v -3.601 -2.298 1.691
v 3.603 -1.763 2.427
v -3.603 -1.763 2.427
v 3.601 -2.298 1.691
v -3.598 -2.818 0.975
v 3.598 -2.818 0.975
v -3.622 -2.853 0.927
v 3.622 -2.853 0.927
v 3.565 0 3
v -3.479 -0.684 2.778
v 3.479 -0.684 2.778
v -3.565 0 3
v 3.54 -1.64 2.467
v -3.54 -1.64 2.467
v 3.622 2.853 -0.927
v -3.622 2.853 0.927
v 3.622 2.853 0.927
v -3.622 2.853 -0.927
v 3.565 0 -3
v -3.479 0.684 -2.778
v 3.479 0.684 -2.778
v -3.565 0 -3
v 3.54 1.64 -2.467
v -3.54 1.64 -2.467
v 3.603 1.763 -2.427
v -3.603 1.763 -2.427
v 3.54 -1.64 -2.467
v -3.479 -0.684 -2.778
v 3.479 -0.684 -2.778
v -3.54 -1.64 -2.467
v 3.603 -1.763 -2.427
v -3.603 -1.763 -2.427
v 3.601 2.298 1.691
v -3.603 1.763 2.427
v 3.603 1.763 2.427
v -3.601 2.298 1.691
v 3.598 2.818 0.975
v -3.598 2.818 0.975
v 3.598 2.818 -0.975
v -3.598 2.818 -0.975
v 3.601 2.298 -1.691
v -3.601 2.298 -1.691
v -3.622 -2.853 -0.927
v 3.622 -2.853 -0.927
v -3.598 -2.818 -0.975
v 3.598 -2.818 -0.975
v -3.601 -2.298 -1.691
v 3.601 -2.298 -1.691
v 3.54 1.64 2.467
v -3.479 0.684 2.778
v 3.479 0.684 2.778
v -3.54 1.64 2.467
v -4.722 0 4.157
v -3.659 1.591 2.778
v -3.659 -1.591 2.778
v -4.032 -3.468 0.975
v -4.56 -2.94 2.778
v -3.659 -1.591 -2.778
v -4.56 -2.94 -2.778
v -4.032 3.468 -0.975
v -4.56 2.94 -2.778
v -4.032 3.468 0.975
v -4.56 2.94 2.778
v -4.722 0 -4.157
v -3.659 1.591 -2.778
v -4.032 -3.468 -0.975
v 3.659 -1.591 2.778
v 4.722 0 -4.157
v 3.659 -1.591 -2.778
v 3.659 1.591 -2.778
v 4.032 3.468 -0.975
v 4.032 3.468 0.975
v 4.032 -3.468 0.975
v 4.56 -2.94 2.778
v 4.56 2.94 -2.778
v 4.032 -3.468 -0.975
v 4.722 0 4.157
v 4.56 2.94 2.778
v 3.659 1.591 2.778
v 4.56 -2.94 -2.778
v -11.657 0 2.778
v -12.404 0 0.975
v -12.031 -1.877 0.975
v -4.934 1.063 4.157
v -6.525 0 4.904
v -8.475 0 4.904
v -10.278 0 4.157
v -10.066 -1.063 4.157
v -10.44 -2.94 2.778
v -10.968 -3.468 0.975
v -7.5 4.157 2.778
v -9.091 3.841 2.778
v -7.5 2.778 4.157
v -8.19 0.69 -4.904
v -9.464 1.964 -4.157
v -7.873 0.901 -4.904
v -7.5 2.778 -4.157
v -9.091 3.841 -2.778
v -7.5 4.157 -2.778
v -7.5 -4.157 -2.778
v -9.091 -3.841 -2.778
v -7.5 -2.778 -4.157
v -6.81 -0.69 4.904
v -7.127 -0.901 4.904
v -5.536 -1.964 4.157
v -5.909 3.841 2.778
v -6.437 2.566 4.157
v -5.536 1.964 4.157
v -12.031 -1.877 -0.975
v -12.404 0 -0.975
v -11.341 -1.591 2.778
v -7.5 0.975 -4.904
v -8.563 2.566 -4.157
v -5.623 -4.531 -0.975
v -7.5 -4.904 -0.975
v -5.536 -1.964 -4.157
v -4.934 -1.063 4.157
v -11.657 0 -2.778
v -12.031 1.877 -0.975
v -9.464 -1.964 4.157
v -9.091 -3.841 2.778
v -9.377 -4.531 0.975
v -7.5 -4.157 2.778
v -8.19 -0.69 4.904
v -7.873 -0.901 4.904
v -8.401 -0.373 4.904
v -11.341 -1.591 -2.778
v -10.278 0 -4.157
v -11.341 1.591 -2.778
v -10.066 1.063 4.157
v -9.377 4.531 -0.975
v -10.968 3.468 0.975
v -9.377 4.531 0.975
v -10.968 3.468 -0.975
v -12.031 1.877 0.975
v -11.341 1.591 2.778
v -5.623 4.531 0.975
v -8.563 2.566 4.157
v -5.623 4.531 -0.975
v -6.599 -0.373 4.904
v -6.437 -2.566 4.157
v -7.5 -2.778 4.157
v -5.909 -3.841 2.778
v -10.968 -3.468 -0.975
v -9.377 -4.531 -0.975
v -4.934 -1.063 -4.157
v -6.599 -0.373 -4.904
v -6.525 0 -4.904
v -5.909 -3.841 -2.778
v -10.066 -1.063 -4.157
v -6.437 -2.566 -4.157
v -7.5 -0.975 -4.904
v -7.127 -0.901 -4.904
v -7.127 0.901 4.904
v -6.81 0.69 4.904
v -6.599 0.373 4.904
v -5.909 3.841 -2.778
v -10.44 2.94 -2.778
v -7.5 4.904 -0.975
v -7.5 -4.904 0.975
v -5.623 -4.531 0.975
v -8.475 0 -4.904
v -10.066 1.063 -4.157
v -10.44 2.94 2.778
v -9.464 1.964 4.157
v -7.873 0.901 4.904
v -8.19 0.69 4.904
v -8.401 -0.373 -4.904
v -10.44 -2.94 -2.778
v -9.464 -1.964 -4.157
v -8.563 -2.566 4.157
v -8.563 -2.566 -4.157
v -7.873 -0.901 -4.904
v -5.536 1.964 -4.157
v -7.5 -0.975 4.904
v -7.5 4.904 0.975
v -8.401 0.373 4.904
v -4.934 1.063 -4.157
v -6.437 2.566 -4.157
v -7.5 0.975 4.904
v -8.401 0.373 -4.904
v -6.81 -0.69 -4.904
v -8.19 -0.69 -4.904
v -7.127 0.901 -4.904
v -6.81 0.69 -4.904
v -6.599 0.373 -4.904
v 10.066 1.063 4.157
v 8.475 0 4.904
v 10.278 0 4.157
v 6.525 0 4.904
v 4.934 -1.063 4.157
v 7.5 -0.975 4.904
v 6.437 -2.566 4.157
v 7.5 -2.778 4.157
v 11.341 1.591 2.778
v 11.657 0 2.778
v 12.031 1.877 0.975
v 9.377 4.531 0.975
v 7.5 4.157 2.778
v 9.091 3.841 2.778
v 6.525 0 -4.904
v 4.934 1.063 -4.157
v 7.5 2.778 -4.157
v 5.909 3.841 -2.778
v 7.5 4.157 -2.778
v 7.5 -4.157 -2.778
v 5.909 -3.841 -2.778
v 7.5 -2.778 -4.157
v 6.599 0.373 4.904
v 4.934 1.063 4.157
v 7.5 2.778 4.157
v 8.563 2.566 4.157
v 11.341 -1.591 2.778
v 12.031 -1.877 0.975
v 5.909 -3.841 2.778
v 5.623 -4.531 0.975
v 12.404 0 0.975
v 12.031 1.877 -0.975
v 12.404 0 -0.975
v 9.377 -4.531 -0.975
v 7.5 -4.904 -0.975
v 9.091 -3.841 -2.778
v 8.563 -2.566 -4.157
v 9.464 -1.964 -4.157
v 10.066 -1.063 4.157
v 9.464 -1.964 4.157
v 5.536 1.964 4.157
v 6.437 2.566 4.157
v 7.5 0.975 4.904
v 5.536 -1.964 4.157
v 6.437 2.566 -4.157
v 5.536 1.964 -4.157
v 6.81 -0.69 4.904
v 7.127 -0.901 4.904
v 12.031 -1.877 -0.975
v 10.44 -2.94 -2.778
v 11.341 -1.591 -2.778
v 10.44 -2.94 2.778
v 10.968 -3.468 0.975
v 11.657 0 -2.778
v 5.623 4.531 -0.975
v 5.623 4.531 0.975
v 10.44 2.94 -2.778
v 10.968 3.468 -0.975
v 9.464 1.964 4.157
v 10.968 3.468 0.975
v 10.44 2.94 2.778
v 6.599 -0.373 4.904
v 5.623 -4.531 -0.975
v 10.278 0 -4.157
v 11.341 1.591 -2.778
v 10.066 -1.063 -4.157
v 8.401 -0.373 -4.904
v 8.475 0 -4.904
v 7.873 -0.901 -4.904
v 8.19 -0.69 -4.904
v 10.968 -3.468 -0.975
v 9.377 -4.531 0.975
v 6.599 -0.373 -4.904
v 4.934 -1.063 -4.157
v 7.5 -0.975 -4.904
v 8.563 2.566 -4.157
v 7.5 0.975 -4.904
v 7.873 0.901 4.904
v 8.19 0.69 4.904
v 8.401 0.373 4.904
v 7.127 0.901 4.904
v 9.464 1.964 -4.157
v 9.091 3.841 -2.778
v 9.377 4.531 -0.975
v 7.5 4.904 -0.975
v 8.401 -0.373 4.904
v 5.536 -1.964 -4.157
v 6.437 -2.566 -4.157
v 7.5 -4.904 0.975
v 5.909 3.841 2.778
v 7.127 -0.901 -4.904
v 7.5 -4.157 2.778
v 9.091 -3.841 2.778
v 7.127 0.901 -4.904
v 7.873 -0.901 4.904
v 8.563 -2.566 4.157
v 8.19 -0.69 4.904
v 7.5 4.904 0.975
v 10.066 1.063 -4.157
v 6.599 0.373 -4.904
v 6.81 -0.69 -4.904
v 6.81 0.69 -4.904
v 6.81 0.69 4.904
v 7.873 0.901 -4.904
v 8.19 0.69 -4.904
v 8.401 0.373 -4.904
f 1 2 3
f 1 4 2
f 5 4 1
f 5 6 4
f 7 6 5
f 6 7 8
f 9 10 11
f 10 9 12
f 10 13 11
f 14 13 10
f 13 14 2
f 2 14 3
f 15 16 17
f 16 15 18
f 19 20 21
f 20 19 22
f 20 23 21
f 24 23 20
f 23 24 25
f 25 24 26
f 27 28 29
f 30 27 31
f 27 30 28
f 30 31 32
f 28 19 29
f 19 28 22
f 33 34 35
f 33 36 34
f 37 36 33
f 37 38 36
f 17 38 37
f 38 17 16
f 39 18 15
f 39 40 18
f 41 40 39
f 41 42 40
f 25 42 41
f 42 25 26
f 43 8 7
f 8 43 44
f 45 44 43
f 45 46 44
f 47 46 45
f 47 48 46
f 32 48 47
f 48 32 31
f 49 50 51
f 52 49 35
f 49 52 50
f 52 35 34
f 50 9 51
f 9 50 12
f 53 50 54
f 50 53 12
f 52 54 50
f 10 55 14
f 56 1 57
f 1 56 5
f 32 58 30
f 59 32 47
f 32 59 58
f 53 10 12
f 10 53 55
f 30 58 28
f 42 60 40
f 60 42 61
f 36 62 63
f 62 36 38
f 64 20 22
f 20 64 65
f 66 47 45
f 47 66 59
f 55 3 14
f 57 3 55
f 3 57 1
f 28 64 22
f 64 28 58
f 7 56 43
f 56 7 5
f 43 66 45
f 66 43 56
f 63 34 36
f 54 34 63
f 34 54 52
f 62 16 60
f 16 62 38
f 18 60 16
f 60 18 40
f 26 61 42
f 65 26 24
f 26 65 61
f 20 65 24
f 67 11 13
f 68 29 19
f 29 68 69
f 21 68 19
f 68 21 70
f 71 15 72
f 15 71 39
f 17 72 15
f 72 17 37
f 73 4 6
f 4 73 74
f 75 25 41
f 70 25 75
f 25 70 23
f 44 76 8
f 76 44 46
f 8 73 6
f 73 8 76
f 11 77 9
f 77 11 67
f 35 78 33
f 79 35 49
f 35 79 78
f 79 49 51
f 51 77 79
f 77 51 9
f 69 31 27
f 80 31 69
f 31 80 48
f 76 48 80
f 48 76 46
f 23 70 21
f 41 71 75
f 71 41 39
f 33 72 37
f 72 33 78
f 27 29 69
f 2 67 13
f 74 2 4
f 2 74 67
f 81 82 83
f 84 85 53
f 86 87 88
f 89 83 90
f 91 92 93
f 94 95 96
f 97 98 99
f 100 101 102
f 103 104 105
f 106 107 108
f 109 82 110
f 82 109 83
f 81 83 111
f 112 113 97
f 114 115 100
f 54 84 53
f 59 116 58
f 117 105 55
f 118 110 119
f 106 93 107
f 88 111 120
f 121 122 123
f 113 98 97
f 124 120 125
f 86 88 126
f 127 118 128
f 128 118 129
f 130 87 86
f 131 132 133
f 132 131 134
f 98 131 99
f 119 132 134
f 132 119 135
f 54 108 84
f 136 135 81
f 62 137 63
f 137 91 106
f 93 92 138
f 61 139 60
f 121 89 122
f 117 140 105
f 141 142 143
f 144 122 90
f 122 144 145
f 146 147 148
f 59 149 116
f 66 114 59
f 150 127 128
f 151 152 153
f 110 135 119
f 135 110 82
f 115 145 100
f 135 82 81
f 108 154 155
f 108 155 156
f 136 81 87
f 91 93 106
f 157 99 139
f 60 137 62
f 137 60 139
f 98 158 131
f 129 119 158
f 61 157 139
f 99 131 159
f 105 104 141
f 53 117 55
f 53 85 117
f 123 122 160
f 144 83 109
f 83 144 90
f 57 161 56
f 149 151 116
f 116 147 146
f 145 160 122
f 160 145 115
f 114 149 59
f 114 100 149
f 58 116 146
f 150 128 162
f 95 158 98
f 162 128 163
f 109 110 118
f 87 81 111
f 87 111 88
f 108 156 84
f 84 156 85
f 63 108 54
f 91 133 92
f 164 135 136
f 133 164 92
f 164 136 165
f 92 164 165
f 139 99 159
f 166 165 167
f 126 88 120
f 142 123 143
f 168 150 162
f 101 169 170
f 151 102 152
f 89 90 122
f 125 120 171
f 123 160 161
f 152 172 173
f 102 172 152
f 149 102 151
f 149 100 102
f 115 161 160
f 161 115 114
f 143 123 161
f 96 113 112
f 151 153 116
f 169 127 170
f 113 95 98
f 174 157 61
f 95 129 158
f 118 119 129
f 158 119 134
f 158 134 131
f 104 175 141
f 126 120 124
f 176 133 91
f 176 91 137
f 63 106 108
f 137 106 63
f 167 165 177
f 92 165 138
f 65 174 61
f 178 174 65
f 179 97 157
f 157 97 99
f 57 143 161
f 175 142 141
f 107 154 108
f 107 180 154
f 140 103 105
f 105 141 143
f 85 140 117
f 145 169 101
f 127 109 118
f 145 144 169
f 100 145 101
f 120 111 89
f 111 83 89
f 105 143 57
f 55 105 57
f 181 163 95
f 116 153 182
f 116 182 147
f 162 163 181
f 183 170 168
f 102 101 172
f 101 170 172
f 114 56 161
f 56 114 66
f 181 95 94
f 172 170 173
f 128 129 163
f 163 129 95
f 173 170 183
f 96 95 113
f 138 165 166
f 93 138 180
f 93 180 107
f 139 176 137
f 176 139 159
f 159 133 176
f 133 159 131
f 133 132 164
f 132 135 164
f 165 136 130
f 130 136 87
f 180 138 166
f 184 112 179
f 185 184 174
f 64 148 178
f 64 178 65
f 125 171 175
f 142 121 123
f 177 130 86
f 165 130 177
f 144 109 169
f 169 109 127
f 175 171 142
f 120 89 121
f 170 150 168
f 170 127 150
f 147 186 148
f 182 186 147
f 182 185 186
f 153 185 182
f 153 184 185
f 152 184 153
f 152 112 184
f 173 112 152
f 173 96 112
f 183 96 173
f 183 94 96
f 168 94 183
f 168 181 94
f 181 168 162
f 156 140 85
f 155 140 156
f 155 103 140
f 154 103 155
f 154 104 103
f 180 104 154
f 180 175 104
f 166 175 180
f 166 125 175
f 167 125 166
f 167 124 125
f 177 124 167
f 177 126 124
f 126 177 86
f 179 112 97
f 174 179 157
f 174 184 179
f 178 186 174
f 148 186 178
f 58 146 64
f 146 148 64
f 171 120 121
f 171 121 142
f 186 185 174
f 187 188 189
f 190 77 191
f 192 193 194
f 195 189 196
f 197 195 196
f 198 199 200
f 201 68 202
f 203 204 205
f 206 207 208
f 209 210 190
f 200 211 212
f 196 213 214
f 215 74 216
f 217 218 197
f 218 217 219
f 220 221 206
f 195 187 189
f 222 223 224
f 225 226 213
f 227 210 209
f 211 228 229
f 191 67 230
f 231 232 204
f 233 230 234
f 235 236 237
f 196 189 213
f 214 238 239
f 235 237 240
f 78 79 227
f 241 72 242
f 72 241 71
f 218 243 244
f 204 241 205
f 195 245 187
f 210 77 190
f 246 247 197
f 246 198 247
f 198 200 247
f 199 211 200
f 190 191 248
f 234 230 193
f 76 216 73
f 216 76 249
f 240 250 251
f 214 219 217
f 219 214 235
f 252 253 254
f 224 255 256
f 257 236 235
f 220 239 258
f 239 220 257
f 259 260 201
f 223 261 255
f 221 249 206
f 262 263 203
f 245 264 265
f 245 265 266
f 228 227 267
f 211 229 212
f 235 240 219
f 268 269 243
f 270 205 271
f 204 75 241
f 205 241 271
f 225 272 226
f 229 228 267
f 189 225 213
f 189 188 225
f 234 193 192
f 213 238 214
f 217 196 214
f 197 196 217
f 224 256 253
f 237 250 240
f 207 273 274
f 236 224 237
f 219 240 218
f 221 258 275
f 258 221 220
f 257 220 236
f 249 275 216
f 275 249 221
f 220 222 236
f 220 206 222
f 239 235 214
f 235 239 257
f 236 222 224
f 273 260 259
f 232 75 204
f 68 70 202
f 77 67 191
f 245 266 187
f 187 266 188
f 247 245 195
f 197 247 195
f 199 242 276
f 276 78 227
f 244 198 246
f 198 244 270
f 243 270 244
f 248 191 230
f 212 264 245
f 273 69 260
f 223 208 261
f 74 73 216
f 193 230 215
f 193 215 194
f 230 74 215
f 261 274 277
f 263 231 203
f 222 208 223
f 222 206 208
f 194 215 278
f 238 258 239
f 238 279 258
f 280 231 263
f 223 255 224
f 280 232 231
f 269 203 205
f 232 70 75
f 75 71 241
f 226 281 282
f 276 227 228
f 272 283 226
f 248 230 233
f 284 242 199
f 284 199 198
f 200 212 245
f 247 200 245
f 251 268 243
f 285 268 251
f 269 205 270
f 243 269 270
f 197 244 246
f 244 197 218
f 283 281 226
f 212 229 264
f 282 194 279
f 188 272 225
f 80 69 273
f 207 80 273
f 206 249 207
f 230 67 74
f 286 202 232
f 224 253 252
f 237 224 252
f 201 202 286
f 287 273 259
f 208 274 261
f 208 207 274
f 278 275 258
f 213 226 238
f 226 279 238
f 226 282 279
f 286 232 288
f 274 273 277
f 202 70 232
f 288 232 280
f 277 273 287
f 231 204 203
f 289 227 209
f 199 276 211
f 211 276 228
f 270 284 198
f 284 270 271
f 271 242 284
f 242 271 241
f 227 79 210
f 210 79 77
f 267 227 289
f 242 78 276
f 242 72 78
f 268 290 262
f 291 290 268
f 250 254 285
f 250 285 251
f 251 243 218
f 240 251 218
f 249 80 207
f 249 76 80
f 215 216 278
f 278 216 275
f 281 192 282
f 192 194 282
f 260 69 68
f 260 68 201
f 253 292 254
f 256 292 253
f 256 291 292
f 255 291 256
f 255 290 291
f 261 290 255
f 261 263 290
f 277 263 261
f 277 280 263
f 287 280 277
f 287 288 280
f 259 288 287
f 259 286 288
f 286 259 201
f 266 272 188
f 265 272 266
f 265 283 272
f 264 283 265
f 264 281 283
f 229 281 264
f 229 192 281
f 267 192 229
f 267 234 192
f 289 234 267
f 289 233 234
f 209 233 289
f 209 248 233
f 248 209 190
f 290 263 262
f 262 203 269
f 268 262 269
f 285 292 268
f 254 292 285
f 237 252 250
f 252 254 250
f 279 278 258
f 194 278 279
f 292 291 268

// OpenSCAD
// Parameters
r_sphere = 5;      // sphere radius
r_bar    = 3;      // bar radius
len_bar  = 15;     // distance between sphere centers

x_left  = -len_bar / 2;
x_right =  len_bar / 2;

// Final dumbbell: spheres + (cylinder trimmed by spheres)
union() {
    // Left and right spheres
    translate([x_left, 0, 0]) sphere(r = r_sphere);
    translate([x_right, 0, 0]) sphere(r = r_sphere);
    
    // Cylinder with the parts inside the spheres cut away
    difference() {
        // Cylinder along X axis
        rotate([0, 90, 0]) 
            cylinder(h = len_bar, r = r_bar, center = true);
        
        // Remove the volume that lies inside the left sphere
        translate([x_left, 0, 0]) sphere(r = r_sphere);
        
        // Remove the volume that lies inside the right sphere
        translate([x_right, 0, 0]) sphere(r = r_sphere);
    }
}
